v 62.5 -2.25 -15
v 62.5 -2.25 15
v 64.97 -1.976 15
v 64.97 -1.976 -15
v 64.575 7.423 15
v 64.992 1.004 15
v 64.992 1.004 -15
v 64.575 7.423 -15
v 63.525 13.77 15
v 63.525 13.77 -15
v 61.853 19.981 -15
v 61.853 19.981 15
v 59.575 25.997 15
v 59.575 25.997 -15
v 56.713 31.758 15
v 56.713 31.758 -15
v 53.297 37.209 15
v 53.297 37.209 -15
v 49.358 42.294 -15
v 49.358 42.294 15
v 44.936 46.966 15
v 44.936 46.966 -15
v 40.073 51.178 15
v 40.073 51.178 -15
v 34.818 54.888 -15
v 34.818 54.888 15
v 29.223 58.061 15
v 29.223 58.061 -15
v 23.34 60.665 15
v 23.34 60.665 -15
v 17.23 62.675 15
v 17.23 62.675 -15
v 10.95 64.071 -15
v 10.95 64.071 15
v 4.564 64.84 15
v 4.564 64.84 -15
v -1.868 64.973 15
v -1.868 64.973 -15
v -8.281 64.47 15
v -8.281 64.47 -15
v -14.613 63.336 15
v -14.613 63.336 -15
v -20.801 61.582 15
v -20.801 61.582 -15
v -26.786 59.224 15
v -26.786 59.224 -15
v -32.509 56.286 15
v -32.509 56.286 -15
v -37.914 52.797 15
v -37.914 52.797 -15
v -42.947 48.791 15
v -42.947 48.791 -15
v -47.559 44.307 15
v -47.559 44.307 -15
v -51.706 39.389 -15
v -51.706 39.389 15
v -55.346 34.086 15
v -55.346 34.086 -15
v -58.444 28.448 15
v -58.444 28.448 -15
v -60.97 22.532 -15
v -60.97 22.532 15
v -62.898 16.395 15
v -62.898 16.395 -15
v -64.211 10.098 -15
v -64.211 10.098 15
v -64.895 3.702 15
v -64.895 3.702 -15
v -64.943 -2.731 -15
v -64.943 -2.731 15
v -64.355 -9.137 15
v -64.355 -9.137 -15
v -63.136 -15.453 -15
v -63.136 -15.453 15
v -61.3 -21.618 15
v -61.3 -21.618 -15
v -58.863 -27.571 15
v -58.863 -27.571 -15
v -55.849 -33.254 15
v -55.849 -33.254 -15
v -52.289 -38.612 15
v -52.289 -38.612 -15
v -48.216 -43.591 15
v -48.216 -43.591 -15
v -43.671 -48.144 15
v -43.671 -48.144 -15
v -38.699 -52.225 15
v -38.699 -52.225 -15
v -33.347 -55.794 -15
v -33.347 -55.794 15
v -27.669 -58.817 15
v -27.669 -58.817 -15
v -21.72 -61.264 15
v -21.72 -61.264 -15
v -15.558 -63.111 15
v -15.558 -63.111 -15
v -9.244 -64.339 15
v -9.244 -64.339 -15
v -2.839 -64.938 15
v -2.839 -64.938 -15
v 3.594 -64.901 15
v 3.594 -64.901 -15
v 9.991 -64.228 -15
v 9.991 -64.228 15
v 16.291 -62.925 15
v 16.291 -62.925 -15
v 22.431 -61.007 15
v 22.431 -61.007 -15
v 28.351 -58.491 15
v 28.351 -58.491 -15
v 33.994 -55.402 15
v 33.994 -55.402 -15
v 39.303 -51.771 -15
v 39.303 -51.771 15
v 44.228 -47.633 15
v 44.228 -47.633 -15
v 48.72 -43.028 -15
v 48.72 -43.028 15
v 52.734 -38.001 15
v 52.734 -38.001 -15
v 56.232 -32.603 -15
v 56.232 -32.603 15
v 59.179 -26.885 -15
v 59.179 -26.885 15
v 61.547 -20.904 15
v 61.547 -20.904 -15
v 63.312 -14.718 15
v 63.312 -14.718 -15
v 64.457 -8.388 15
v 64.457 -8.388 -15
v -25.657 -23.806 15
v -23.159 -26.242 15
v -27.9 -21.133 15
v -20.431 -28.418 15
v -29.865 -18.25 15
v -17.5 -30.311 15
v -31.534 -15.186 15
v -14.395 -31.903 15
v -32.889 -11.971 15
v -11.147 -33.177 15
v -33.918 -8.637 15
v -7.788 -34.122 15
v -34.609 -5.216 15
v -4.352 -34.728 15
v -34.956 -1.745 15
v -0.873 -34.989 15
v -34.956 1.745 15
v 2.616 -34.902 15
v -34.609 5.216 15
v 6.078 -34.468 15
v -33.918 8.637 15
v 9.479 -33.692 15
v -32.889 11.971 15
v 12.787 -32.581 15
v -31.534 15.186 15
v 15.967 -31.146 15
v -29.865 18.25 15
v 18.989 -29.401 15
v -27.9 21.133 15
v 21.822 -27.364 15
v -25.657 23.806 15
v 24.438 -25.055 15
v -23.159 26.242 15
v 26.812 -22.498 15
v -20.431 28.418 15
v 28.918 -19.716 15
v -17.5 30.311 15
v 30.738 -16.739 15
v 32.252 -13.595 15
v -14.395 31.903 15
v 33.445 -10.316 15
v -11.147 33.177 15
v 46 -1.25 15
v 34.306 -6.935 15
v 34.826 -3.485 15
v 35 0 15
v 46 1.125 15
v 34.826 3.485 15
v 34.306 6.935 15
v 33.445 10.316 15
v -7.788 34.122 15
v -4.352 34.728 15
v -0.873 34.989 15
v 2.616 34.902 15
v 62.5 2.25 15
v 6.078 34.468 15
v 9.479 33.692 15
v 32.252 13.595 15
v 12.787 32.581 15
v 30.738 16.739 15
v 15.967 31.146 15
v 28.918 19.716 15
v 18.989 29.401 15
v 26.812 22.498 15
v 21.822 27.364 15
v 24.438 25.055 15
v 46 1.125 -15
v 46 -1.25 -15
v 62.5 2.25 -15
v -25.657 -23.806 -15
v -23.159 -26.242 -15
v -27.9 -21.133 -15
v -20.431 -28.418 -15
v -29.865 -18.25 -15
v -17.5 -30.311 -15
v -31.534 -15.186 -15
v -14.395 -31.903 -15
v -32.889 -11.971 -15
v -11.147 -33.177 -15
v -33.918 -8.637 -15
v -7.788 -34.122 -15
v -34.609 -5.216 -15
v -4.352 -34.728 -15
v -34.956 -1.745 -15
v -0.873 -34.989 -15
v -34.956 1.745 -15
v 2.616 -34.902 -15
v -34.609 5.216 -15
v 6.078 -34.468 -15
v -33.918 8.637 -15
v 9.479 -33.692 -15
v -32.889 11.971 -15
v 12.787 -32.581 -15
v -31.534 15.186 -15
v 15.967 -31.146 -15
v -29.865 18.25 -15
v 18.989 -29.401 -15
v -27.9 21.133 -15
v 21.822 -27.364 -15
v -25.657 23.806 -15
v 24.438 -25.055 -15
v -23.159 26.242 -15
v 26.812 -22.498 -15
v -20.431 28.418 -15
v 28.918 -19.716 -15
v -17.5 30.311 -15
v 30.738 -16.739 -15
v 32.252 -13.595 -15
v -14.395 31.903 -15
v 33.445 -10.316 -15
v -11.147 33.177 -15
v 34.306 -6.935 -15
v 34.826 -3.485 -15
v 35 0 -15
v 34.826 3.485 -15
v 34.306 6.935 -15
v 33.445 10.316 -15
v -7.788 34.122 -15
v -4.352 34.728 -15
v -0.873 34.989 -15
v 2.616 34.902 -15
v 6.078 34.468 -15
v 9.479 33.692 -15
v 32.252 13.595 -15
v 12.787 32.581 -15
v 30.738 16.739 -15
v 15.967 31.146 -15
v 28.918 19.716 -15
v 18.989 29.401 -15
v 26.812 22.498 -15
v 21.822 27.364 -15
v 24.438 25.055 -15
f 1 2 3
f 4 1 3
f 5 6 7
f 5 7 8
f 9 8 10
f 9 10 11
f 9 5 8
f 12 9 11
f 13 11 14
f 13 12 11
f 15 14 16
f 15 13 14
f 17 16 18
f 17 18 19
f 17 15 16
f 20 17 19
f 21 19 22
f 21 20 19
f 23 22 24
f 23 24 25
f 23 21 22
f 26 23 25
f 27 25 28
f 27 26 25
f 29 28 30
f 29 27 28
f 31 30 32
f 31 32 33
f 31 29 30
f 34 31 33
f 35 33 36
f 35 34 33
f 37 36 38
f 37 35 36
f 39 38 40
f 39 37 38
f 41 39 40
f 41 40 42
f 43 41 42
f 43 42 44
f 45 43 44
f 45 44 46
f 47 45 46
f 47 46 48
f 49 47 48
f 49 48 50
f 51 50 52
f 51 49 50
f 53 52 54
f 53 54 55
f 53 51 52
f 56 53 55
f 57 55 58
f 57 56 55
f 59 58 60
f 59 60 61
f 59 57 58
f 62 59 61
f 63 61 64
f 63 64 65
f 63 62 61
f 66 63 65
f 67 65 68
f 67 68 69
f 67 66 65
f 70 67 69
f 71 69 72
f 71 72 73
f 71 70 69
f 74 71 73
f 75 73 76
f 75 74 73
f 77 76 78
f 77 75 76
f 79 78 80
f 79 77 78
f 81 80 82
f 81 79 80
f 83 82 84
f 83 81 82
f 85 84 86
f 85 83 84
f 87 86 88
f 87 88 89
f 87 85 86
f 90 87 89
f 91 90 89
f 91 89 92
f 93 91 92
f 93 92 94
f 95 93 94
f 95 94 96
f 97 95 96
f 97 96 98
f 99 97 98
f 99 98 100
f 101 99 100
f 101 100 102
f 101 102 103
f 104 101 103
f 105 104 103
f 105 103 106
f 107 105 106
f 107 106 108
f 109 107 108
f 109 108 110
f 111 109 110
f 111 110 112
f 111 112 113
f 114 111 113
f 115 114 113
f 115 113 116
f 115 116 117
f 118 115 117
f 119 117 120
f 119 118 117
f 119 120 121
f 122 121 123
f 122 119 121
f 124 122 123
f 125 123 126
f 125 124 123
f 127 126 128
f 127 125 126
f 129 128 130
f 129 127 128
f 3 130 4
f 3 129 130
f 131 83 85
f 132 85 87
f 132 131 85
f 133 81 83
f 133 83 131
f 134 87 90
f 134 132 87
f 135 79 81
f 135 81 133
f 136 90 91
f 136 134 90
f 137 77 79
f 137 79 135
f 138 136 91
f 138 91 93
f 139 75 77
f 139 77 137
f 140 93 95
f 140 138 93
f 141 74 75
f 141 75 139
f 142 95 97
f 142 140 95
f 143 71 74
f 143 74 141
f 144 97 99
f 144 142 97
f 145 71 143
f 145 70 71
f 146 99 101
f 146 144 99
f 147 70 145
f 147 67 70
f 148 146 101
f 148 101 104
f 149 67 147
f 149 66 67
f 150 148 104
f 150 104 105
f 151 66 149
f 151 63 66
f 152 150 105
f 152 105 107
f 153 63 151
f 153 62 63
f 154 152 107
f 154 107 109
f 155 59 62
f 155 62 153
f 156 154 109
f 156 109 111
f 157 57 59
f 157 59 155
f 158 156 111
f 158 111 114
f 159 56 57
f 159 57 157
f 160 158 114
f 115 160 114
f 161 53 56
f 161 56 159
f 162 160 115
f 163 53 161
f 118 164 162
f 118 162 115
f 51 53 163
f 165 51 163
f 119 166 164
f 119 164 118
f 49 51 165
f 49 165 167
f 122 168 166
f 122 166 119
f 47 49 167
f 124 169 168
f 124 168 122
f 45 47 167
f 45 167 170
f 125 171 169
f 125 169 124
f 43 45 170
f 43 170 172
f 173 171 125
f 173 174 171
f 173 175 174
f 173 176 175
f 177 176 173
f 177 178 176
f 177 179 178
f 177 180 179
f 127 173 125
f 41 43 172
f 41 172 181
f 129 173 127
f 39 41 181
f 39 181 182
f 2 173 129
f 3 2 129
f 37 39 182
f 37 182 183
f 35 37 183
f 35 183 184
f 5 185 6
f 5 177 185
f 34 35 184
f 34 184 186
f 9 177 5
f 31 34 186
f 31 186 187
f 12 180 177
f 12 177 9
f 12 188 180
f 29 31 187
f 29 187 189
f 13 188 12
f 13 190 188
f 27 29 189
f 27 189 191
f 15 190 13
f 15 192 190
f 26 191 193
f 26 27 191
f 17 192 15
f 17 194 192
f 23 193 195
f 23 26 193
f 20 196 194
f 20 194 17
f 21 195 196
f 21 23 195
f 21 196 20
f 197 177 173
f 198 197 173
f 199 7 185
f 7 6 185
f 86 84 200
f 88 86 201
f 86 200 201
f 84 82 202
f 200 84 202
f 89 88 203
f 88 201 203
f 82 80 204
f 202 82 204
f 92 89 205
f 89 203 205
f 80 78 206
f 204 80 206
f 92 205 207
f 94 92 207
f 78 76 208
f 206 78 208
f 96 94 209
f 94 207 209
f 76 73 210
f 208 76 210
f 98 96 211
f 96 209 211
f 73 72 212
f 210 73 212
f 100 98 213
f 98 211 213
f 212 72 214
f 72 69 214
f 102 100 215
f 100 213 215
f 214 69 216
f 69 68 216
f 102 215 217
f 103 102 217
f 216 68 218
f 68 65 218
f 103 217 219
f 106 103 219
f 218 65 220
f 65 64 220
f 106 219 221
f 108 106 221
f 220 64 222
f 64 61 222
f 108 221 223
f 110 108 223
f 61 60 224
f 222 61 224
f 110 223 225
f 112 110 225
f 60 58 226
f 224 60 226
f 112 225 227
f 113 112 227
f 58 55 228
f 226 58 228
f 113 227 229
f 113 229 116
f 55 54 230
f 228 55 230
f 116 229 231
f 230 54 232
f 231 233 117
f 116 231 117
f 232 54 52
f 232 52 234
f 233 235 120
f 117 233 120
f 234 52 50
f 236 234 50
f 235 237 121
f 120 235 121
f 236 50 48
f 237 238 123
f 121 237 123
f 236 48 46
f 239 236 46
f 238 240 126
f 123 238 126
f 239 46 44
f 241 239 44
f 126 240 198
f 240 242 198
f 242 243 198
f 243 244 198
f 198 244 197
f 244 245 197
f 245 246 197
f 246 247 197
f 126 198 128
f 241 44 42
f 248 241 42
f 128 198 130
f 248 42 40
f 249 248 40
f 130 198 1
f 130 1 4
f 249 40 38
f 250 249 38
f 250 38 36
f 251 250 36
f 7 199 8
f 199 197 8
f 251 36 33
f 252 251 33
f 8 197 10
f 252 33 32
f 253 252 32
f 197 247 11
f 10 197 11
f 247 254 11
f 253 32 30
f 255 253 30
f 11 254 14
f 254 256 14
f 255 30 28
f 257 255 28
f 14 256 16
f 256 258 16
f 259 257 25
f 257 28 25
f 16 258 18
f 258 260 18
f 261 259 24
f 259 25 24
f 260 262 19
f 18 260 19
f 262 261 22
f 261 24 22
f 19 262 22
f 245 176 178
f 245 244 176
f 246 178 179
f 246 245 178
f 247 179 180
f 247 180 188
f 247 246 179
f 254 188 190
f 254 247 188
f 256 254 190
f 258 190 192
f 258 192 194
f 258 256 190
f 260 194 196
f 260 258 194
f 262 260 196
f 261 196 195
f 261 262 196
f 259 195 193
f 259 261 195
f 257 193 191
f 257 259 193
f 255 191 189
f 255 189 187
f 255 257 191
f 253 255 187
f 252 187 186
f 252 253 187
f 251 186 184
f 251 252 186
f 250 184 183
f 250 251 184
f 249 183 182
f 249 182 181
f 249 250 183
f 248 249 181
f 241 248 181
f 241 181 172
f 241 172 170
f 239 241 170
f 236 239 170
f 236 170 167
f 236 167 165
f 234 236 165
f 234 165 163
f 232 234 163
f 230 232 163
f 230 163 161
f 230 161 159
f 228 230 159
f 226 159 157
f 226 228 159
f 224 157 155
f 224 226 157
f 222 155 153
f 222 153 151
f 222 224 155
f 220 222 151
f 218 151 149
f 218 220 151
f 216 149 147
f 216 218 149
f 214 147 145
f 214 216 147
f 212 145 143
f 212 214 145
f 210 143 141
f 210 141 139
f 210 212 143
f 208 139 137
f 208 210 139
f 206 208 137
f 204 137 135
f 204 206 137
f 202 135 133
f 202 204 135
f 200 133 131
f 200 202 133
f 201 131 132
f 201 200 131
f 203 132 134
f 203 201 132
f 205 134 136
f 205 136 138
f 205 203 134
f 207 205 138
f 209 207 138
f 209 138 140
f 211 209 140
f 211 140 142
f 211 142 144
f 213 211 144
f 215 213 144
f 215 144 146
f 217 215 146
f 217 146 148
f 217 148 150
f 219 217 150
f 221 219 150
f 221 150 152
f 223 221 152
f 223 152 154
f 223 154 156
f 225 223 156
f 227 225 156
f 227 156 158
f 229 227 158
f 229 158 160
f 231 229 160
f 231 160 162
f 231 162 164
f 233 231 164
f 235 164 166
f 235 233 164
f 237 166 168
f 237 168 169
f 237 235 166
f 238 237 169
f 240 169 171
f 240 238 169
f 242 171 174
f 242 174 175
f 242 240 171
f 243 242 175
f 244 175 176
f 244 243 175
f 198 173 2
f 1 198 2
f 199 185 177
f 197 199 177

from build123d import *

# Parameters (mm, degrees)
SKETCH_1_R          = 65
SKETCH_1_R_2        = 35
STATOR_BLANK_DEPTH  = 15
SLOT_CUT_TEST_DEPTH = 20


with BuildPart() as part:
    # Эскиз1 → Stator_blank (new, symmetric)
    with BuildSketch(Plane.XY):
        Circle(SKETCH_1_R)
        Circle(SKETCH_1_R_2, mode=Mode.SUBTRACT)
    extrude(amount=STATOR_BLANK_DEPTH, both=True)

    # Эскиз2 → Slot_cut_test (cut, symmetric)
    with BuildSketch(Plane.XY):
        Polygon((46, -1.25), (62.5, -2.25), (67, -1.75), (67, 0), (62.5, 2.25), (46, 1.125), align=None)
    extrude(amount=SLOT_CUT_TEST_DEPTH, both=True, mode=Mode.SUBTRACT)


solid = part.part
